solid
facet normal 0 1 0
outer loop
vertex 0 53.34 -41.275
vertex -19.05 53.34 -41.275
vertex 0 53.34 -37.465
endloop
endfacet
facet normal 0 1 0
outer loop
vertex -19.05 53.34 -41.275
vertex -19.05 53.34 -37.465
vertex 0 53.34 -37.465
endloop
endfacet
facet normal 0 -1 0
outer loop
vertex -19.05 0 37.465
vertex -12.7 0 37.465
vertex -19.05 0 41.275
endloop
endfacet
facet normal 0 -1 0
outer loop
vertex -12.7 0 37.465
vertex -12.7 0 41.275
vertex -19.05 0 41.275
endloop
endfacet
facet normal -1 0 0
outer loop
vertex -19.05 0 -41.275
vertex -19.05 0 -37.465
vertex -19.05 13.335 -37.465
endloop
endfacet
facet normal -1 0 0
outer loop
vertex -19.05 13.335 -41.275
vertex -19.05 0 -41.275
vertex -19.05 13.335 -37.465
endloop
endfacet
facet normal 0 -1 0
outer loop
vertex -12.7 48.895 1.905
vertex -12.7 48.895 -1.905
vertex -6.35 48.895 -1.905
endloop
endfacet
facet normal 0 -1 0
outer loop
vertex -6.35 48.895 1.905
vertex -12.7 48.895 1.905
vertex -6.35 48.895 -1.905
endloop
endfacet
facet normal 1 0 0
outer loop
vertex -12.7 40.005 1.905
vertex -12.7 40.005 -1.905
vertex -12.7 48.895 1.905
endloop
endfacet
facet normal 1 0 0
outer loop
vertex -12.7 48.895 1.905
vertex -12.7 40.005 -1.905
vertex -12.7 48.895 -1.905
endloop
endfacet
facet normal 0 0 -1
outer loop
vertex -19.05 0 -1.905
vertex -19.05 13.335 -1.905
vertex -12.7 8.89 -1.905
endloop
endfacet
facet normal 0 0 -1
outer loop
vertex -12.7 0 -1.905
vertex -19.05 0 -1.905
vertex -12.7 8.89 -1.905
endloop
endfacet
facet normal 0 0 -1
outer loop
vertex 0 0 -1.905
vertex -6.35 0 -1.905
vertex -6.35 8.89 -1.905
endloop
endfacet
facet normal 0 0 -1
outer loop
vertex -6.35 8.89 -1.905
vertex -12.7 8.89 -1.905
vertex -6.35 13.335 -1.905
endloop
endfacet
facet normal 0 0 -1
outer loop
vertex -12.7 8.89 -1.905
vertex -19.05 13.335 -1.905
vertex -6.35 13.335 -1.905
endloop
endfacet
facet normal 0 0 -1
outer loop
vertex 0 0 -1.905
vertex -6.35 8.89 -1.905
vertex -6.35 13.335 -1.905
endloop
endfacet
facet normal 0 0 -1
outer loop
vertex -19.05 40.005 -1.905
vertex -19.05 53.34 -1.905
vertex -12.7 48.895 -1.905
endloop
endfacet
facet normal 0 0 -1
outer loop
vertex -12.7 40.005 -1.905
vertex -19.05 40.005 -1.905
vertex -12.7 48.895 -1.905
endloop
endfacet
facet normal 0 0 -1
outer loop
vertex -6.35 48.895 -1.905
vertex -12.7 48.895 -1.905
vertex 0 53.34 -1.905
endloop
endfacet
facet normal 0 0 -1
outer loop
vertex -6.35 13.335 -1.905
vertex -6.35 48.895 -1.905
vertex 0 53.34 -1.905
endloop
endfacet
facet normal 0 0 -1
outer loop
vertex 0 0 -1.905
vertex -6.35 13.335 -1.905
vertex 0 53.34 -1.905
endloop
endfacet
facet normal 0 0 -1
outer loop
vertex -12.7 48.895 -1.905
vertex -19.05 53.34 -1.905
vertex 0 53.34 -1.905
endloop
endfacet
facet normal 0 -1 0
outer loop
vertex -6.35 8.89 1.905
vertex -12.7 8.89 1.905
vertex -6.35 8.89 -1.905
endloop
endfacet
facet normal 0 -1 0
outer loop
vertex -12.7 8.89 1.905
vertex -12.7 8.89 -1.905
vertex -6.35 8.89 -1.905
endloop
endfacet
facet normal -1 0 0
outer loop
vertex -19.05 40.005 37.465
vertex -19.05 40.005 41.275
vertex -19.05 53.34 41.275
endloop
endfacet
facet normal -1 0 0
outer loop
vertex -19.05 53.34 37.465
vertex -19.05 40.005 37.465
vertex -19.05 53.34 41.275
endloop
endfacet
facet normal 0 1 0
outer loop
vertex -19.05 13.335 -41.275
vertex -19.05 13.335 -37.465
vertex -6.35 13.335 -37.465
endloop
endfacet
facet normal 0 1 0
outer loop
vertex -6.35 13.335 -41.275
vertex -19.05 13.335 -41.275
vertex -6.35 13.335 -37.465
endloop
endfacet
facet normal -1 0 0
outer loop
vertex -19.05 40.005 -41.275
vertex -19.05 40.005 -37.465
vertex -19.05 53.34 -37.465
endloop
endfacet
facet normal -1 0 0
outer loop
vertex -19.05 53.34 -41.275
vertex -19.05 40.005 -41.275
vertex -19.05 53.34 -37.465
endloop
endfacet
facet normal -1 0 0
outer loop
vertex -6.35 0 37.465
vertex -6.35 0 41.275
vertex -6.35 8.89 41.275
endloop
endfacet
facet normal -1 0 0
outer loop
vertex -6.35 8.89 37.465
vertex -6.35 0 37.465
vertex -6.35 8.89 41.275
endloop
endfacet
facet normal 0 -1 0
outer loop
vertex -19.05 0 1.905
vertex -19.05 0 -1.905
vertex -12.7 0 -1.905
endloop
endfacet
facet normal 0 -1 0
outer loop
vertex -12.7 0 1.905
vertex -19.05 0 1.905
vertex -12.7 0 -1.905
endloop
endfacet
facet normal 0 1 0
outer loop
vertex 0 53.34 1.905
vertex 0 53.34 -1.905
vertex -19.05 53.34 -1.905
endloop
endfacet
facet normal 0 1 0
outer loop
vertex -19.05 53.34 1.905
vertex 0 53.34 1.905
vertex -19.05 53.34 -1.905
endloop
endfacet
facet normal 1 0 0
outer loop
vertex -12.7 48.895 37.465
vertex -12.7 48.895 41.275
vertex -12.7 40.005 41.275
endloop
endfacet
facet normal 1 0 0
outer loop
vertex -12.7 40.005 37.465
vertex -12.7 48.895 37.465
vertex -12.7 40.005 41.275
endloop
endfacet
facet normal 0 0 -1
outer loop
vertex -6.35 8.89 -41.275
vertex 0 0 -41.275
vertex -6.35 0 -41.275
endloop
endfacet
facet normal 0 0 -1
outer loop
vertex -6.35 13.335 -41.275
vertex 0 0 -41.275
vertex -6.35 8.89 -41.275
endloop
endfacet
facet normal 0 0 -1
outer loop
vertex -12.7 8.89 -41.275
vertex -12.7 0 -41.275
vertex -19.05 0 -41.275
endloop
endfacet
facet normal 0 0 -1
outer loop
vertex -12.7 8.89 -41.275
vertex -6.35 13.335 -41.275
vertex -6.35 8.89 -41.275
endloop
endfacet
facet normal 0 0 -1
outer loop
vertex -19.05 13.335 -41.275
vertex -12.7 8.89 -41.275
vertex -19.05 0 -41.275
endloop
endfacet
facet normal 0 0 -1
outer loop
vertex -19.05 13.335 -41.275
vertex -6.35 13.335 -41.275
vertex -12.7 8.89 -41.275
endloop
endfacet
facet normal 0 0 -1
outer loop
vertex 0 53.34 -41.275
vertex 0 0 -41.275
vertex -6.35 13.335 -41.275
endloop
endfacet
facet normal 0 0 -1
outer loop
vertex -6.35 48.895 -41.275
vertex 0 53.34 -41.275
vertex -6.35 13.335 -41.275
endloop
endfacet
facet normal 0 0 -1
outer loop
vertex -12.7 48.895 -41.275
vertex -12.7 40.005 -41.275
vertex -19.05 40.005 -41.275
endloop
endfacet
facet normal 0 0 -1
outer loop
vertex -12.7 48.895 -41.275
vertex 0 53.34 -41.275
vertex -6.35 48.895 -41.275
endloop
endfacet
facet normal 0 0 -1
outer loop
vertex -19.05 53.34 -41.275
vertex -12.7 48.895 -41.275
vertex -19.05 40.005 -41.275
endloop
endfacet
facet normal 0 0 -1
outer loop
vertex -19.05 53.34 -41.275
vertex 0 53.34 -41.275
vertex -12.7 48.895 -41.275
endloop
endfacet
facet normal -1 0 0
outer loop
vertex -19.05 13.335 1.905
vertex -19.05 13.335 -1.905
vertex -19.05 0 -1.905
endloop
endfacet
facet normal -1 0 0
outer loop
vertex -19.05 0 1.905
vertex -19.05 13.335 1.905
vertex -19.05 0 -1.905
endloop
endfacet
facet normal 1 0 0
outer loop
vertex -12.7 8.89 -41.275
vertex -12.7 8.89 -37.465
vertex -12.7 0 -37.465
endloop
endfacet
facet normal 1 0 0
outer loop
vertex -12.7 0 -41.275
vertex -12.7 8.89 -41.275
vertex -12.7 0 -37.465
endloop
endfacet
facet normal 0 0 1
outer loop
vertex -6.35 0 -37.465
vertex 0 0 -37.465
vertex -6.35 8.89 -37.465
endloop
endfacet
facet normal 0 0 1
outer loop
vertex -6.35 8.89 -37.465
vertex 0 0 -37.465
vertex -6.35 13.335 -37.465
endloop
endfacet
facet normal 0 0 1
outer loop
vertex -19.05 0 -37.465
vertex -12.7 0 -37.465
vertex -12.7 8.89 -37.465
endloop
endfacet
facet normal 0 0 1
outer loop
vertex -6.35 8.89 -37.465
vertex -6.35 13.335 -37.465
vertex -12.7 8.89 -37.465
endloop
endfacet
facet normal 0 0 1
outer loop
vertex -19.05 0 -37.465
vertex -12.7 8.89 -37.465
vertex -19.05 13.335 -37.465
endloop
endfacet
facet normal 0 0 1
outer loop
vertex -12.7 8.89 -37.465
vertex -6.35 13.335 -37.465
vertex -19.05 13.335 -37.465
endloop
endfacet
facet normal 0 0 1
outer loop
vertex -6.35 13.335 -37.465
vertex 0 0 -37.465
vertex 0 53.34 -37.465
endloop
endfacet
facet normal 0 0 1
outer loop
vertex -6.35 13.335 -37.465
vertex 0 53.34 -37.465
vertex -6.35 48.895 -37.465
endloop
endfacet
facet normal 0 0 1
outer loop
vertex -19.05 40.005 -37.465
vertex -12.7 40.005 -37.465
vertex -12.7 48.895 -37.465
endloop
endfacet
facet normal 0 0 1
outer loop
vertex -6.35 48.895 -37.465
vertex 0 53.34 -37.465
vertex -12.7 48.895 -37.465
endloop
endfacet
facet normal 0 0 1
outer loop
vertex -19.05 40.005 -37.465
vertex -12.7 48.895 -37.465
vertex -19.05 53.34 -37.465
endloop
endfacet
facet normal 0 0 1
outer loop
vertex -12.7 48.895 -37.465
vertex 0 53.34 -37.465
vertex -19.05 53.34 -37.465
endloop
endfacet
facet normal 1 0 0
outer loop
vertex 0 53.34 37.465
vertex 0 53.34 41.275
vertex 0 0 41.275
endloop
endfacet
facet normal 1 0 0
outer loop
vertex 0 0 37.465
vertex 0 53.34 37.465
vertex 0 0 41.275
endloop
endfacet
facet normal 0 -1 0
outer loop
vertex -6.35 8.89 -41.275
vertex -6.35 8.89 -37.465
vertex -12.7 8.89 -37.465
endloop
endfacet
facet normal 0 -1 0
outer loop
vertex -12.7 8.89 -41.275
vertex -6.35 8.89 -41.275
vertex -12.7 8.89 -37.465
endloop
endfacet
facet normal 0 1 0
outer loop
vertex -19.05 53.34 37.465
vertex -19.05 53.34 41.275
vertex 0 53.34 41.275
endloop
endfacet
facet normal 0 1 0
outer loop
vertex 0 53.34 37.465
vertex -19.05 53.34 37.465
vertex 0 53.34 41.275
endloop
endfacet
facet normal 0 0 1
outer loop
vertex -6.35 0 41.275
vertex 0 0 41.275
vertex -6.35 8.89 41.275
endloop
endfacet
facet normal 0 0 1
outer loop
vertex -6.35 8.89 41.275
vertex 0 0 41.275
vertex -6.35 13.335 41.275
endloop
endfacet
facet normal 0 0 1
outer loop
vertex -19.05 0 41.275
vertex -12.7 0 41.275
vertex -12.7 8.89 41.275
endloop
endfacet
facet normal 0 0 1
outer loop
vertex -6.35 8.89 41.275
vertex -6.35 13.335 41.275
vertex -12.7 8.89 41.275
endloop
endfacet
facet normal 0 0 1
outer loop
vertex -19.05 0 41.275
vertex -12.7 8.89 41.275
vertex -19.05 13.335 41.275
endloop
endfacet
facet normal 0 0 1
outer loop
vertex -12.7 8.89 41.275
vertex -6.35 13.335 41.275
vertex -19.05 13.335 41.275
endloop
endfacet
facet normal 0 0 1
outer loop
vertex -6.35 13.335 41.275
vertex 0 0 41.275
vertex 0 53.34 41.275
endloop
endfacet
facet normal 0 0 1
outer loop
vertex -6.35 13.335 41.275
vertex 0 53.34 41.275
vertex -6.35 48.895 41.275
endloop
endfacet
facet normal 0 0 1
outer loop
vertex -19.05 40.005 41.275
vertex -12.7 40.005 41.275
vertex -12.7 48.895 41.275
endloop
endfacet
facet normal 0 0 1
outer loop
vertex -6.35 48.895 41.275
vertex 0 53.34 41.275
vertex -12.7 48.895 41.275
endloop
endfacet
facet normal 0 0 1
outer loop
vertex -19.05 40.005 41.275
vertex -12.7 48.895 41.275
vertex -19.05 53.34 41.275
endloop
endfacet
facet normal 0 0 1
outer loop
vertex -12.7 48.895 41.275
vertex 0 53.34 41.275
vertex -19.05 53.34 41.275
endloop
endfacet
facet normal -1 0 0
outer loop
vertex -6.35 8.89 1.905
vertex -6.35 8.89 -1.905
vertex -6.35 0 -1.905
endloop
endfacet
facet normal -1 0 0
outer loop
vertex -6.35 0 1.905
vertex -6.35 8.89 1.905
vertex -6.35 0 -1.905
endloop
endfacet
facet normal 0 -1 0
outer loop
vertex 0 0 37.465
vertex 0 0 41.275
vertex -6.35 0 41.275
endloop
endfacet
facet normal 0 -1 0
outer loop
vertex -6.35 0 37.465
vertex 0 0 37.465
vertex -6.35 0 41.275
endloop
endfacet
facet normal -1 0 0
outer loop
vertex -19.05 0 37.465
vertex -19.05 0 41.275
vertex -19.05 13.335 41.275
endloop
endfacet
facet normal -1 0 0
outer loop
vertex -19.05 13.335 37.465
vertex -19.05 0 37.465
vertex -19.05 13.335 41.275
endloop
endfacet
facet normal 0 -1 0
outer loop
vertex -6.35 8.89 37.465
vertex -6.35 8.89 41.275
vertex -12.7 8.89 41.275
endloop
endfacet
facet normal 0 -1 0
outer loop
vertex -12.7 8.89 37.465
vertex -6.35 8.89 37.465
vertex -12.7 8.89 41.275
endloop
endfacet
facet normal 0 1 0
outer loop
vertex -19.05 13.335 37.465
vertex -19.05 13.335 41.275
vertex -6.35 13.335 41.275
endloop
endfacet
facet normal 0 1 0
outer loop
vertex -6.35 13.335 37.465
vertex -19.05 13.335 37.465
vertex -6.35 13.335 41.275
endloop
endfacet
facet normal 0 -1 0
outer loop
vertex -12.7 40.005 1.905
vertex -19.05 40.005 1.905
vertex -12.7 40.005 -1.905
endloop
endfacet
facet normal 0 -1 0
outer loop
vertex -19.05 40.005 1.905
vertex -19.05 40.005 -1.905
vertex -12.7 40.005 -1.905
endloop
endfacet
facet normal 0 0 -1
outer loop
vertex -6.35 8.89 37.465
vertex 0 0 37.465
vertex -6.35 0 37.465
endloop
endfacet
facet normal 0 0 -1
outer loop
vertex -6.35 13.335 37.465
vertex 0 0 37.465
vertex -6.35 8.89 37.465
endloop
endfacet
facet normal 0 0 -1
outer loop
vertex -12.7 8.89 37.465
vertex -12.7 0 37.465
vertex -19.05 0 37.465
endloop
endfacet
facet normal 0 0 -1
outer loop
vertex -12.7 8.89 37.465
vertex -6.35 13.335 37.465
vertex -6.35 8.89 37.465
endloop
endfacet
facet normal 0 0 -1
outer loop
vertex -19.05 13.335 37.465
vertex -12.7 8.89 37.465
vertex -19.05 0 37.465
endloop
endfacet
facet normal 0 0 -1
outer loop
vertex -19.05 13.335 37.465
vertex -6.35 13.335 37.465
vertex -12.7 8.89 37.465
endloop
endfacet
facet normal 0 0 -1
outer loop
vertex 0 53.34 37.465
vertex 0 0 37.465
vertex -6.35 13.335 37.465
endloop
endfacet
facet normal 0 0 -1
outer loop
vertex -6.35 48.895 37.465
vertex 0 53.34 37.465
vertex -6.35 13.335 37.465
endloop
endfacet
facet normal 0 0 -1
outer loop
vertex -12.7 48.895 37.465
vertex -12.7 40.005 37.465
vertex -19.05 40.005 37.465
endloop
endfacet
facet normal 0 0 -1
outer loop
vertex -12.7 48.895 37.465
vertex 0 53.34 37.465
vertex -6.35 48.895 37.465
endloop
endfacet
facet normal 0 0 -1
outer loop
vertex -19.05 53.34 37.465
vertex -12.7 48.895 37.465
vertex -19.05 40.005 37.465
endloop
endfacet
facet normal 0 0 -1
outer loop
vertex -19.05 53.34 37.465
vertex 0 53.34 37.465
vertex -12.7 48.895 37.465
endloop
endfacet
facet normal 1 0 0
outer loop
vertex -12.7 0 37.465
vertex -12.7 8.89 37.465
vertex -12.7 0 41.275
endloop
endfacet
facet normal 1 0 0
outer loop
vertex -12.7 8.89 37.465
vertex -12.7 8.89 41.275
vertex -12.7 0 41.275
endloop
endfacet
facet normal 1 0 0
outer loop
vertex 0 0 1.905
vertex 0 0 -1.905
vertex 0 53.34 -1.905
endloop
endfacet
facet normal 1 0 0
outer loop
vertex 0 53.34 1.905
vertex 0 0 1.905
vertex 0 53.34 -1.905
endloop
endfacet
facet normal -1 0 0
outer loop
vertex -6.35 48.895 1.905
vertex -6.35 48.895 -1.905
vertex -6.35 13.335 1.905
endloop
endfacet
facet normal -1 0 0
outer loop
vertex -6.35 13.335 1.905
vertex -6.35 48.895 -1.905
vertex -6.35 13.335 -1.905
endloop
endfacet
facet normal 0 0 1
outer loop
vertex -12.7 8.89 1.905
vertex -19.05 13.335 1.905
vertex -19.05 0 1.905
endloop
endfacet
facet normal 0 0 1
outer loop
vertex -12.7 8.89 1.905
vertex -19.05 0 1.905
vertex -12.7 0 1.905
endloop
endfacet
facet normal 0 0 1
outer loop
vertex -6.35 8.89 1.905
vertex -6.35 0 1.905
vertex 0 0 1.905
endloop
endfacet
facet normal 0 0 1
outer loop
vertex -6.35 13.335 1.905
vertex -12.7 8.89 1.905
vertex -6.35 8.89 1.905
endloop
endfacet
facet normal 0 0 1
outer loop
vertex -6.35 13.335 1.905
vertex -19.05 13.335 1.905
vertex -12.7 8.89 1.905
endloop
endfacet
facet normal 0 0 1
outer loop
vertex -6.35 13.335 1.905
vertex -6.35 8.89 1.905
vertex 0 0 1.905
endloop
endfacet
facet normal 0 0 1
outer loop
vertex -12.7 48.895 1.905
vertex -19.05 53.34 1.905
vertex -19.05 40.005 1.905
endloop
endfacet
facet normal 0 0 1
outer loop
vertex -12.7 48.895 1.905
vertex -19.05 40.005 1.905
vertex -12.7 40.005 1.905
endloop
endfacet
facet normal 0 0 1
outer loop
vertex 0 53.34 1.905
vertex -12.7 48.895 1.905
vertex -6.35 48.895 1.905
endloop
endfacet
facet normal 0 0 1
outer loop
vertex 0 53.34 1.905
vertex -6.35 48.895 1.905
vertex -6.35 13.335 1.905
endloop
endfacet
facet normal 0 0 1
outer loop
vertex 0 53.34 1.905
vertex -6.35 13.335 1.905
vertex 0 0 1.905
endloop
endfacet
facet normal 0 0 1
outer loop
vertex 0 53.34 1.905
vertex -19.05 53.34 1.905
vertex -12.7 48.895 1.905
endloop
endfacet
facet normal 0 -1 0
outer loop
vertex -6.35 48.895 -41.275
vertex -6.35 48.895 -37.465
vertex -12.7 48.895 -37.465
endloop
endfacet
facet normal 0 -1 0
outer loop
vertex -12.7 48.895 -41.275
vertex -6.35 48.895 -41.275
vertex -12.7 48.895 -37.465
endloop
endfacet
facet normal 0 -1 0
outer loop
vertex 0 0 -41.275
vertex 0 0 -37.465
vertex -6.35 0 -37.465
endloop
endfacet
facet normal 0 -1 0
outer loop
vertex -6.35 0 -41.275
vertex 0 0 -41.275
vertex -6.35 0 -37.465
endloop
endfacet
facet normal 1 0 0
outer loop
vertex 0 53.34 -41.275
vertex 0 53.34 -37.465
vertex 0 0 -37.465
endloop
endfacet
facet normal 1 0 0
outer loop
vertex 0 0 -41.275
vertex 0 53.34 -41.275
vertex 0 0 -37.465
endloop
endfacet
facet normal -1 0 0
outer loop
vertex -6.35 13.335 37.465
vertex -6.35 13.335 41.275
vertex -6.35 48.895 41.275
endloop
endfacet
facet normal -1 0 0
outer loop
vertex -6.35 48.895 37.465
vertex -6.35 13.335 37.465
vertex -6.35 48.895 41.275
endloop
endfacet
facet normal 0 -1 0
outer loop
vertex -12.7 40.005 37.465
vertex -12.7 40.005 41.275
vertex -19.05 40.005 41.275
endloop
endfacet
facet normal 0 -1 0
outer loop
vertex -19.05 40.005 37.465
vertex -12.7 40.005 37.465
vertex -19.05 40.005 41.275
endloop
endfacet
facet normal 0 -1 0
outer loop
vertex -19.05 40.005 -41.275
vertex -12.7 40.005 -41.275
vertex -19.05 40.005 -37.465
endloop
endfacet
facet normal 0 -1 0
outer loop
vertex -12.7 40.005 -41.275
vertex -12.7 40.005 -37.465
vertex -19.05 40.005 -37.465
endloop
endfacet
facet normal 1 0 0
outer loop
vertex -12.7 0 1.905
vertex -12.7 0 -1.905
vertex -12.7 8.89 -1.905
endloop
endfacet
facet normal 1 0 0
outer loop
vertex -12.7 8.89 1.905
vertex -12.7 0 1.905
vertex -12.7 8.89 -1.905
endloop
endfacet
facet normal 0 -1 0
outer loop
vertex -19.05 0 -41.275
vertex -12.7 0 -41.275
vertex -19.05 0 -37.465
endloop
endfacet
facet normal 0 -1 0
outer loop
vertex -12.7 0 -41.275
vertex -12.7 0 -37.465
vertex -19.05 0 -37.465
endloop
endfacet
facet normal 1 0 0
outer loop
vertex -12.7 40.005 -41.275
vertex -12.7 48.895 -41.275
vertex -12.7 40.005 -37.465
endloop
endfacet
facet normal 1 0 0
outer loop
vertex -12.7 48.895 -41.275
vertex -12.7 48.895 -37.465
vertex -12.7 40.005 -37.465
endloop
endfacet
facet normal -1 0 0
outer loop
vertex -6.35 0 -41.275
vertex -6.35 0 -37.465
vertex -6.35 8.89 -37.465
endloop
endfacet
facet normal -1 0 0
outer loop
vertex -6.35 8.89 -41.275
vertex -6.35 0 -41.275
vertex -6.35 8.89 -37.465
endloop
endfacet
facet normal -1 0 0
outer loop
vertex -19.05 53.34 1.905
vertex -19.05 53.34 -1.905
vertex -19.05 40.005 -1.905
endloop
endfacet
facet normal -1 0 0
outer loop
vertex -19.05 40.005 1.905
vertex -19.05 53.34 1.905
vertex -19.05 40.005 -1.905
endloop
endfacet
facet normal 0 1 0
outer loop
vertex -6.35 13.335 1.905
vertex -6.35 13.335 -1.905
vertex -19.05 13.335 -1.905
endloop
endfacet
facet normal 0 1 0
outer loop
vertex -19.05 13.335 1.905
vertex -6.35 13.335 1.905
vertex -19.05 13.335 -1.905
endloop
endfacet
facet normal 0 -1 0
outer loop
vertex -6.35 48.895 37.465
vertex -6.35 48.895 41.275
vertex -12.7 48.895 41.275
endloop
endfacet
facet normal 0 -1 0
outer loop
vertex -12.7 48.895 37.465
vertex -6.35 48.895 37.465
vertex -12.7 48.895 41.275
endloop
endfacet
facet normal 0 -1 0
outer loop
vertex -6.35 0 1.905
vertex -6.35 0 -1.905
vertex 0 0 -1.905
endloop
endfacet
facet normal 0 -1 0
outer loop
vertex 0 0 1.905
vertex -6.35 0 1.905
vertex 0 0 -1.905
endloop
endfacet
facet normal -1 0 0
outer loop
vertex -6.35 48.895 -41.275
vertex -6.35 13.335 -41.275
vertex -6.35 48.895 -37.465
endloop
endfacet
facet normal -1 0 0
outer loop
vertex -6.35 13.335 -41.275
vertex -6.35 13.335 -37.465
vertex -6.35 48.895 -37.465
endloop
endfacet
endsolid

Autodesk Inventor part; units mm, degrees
ref_plane "YZ Plane" through (0, 0, 0) normal (1, 0, 0) x (0, 1, 0)
sketch "Sketch1" plane through (0, 0, 0) normal (0, 0, 1) x (1, 0, 0)
  line L0 (0, 6.35) -> (0, 53.34)
  line L1 (0, 53.34) -> (-19.05, 53.34)
  line L2 (-19.05, 53.34) -> (-19.05, 55.245)
  line L3 (-12.7, 48.895) -> (-6.35, 48.895)
  line L4 (-6.35, 48.895) -> (-6.35, 13.335)
  line L5 (-6.35, 13.335) -> (-19.05, 13.335)
  line L6 (-19.05, 13.335) -> (-19.05, 12.7)
  line L7 (-12.7, 8.89) -> (-6.35, 8.89)
  line L8 (-6.35, 8.89) -> (-6.35, 0)
  line L9 (-6.35, 0) -> (0, 0)
  line L10 (-19.05, 55.245) -> (-19.05, 40.005)
  line L11 (-19.05, 40.005) -> (-12.7, 40.005)
  line L12 (-12.7, 40.005) -> (-12.7, 48.895)
  line L13 (-19.05, 12.7) -> (-19.05, 0)
  line L14 (-19.05, 0) -> (-12.7, 0)
  line L15 (-12.7, 0) -> (-12.7, 8.89)
  line L16 (0, 0) -> (0, 6.35)
  point P0 (-19.05, 53.34)
  point P1 (-19.05, 11.43)
  dimension "d1" = 35.56
  dimension "d2" = 4.445
  dimension "d3" = 4.445
  dimension "d4" = 6.35
  dimension "d6" = 6.35
  dimension "d7" = 6.35
  dimension "d13" = 13.335
  dimension "d14" = 13.335
extrude "Extrusion1" add sketch "Sketch1" along normal mid plane 3.81
ref_plane "Work Plane2" through (0, 0, 19.685) normal (0, 0, 1) x (1, 0, 0)
ref_plane "Work Plane3" through (0, 0, -19.685) normal (0, 0, 1) x (1, 0, 0)
mirror "Mirror2" about plane through (0, 0, 19.685) normal (0, 0, 1) of "Extrusion1"
mirror "Mirror3" about plane through (0, 0, -19.685) normal (0, 0, 1) of "Extrusion1"
equation "\"d11\" = width"
equation "\"d16\" = oneHalfSpacing"
equation "\"d17\" = -oneHalfSpacing"
equation "\"width\" = 3.81"
equation "\"spacing\" = 39.37"
equation "\"oneHalfSpacing\" = 0.5 * spacing"
properties part number "threeStartConfigurationV01" material "PET Plastic"
